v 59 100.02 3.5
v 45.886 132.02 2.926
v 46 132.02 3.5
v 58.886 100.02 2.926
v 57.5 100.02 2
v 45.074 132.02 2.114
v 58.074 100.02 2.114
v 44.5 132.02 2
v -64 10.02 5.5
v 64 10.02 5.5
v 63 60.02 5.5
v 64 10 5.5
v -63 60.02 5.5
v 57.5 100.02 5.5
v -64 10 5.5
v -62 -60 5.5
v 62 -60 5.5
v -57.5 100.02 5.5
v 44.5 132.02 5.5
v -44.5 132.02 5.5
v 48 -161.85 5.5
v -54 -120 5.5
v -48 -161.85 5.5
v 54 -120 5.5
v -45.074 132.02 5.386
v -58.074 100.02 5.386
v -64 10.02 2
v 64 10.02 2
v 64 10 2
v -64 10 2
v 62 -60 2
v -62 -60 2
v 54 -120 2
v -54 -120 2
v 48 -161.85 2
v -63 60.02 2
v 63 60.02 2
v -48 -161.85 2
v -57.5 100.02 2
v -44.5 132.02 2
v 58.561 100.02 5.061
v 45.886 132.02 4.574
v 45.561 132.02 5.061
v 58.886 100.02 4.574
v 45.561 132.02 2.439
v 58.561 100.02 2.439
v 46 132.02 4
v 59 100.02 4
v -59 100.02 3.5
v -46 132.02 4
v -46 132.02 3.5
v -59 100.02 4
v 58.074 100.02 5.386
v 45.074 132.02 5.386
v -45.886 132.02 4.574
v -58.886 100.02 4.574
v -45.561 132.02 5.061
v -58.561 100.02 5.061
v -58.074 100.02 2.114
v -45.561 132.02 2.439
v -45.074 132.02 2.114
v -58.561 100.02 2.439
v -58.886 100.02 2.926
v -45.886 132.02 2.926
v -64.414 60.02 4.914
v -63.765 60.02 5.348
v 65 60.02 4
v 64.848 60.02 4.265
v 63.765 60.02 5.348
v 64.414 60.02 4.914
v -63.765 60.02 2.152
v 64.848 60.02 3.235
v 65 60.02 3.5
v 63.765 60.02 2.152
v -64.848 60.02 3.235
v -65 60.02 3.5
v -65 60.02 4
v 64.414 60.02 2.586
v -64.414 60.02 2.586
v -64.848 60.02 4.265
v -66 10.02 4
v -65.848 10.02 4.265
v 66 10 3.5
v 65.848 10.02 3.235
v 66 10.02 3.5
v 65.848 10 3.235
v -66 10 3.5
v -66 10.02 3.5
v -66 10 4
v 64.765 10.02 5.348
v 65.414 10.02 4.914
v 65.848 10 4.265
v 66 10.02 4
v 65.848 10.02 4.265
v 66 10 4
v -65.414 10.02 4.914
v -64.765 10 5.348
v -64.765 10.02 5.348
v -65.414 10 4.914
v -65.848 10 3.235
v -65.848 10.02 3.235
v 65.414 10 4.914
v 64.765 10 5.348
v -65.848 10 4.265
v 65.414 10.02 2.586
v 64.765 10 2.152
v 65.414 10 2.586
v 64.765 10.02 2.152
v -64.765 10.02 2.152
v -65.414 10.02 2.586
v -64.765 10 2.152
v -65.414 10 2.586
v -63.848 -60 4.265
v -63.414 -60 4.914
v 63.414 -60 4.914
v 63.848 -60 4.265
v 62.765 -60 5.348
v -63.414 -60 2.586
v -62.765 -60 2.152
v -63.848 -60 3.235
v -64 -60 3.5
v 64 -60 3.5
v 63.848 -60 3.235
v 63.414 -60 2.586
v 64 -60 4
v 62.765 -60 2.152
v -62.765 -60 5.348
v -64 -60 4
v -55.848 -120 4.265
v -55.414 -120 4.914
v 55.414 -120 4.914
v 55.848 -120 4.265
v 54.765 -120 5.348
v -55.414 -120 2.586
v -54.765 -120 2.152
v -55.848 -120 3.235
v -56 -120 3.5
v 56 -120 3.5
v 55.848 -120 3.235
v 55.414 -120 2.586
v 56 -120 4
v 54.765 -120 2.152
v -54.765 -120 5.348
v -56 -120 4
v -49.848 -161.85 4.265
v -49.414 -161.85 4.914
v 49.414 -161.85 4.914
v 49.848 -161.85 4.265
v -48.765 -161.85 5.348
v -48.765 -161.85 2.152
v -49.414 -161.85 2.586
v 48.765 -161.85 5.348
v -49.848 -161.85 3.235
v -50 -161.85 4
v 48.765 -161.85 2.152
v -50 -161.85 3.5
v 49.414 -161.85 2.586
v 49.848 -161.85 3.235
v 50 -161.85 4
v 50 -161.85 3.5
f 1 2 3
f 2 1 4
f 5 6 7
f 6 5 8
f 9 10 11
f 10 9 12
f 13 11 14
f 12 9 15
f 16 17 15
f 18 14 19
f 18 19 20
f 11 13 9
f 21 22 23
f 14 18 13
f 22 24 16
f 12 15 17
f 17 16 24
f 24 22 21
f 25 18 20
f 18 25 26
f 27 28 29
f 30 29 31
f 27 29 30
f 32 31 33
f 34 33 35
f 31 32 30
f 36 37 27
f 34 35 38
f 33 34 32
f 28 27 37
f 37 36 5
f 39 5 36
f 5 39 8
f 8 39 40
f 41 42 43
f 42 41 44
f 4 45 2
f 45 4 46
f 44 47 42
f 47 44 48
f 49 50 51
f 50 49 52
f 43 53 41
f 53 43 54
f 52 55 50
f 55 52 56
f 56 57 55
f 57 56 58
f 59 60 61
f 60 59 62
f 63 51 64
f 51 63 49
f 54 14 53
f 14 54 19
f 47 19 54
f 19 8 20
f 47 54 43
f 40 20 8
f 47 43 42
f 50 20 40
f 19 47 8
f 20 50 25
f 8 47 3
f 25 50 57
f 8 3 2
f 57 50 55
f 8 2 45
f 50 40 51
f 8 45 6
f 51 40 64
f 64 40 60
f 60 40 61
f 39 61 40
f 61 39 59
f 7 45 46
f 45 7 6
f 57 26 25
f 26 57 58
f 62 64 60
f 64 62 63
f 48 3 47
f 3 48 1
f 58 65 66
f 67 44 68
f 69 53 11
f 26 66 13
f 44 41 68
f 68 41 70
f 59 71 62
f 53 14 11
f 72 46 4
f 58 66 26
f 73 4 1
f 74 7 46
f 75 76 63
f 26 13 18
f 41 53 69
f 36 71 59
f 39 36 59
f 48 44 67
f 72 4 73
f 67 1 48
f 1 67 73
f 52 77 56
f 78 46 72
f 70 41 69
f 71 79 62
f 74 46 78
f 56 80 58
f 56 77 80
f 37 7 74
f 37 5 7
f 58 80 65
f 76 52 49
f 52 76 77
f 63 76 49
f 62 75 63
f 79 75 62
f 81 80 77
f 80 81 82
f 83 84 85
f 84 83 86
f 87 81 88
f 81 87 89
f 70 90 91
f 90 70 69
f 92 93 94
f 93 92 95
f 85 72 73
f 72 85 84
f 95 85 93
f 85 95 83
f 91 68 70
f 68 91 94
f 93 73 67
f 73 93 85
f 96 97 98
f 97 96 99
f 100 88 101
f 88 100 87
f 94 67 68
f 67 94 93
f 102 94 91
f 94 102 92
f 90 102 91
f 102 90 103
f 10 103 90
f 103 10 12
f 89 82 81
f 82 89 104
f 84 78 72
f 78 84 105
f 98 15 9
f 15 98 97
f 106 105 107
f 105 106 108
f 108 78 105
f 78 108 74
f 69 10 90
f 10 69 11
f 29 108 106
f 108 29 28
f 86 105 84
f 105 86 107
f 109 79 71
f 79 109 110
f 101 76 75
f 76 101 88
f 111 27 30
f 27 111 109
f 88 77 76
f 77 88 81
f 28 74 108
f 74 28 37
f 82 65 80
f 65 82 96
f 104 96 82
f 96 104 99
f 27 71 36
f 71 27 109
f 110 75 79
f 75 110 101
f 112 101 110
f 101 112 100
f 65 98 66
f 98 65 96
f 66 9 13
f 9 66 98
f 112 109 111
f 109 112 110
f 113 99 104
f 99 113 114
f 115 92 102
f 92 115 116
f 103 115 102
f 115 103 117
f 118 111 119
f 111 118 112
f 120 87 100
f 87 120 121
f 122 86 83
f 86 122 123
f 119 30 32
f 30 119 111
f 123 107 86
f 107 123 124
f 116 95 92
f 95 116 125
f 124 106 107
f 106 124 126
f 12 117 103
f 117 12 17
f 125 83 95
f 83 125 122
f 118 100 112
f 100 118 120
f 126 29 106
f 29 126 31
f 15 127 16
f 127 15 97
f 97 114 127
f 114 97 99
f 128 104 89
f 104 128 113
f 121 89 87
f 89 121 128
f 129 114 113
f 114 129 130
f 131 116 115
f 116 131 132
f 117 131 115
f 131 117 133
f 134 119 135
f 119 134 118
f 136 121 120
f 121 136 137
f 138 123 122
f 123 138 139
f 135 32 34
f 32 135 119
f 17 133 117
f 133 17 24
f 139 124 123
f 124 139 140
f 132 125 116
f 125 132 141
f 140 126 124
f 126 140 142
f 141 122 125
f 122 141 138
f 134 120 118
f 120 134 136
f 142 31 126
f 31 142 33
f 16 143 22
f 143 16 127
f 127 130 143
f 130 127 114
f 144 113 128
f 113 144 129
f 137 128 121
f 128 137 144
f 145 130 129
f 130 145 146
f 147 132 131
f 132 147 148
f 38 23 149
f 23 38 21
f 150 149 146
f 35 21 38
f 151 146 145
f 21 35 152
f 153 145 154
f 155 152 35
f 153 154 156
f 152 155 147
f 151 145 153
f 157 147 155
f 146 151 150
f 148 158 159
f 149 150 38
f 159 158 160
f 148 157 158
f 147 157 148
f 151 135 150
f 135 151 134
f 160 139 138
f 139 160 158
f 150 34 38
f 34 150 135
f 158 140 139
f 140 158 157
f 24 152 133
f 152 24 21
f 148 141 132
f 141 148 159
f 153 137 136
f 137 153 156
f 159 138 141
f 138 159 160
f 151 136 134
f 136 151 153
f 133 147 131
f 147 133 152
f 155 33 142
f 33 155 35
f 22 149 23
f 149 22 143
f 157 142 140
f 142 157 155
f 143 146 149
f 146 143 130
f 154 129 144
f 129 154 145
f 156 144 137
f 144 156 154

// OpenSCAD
// file: ../lib.scad
// ===== 공용 프리미티브 (params 의존 없음 — use로 포함. 함정 1) =====

// 두 점을 잇는 캡슐. 끝단이 od/2 만큼 뻗는다 (함정 3)
module rod(p1, p2, od, fn = 56)
    hull() { translate(p1) sphere(d = od, $fn = fn);
             translate(p2) sphere(d = od, $fn = fn); }

function mir(p, s = 1) = [s * p.x, p.y, p.z];

// --- 라운디드 사각 2D 폴리곤 (CCW) ---
function arc_pt(cx, cy, r, a) = [cx + r * cos(a), cy + r * sin(a)];
function rrpts(w, h, r, n = 4) =
    let (x = w / 2 - r, y = h / 2 - r)
    concat(
        [for (i = [0:n]) arc_pt( x, -y, r, -90 + 90 * i / n)],
        [for (i = [0:n]) arc_pt( x,  y, r,   0 + 90 * i / n)],
        [for (i = [0:n]) arc_pt(-x,  y, r,  90 + 90 * i / n)],
        [for (i = [0:n]) arc_pt(-x, -y, r, 180 + 90 * i / n)]);

// y 위치의 XZ 단면 슬래브 (중심 x0/zc, 폭 w/높이 h, 모서리 r).
// 회전 매핑: 2D x→차량 X, 2D y→차량 Z, 돌출 +z→−Y (y..y+0.02 전방 전용, 함정 20)
module slabr(y, x0, w, h, zc, r)
    translate([x0, y + 0.02, zc]) rotate([90, 0, 0])
        linear_extrude(0.02) polygon(rrpts(w, h, r));

// 단면 체인 loft: sec = [[y, x0, w, h, zc, r], ...]
module loftr(sec)
    for (i = [0 : len(sec) - 2])
        hull() {
            slabr(sec[i][0],     sec[i][1],     sec[i][2],     sec[i][3],     sec[i][4],     sec[i][5]);
            slabr(sec[i + 1][0], sec[i + 1][1], sec[i + 1][2], sec[i + 1][3], sec[i + 1][4], sec[i + 1][5]);
        }

// 라운디드 박스 (z0..z1 수직, 평면 모서리 r)
module rbox(xc, yc, z0, z1, dx, dy, r, fn = 32)
    hull() for (px = [-1, 1], py = [-1, 1])
        translate([xc + px * (dx / 2 - r), yc + py * (dy / 2 - r), z0])
            cylinder(r = r, h = z1 - z0, $fn = fn);

// --- NACA 계열 에어포일 (LE 원점, 2D +x = 현 방향) ---
function _yt(x, c, t) = 5 * t * c * (0.2969*sqrt(x) - 0.1260*x - 0.3516*x*x
    + 0.2843*x*x*x - 0.1036*x*x*x*x);
function _yc(x, c, m) = 4 * m * c * x * (1 - x);
function naca_pts(c, t, m, n = 12) =
    concat(
        [for (i = [0:n])     let (x = i / n)     [x*c,  _yt(x, c, t) + _yc(x, c, m)]],
        [for (i = [n-1:-1:0]) let (x = i / n)    [x*c, -_yt(x, c, t) + _yc(x, c, m)]]);

// 슬라이스 3D 링: v=[x, yle, zle, c, aoa, th, cam] → 받각 회전된 naca 점의 링
// (th/cam은 mm — 현 대비 비율로 정규화)
function wring(v, n = 12) =
    let (c = v[3], t = v[5] / c, m = v[6] / c, pts = naca_pts(c, t, m, n),
         ca = cos(v[4]), sa = sin(v[4]))
    // 코드 방향 (ca,sa) + 두께/캠버 수직 방향 (-sa,ca) — 2D y 누락 금지
    [for (p = pts) [v[0], v[1] + p[0] * ca - p[1] * sa, v[2] + p[0] * sa + p[1] * ca]];

// 진짜 로프트 윙 — polyhedron 스트립. hull 체인은 캠버진 하면을 볼록 껍질로
// 채워(LE→TE 직선 웨지) 요소가 처지므로 쓰지 않는다
module wing3(sl, n = 12) {
    rings = [for (v = sl) wring(v, n)];
    ns = len(rings);
    m = len(rings[0]);
    pts = [for (r = rings, p = r) p];
    function ix(i, k) = i * m + (k % m);
    faces = concat(
        // 측면 스트립 (사중면 → 삼각형 2) — 외향 노멀 권선(캡과 일치)
        [for (i = [0 : ns - 2], k = [0 : m - 1])
            each [[ix(i, k), ix(i, k + 1), ix(i + 1, k + 1)],
                  [ix(i, k), ix(i + 1, k + 1), ix(i + 1, k)]]],
        // 끝 캡 (링은 단순 폴리곤 — 팬 삼각분할)
        [for (k = [1 : m - 2]) [ix(0, 0), ix(0, k + 1), ix(0, k)]],
        [for (k = [1 : m - 2]) [ix(ns - 1, 0), ix(ns - 1, k), ix(ns - 1, k + 1)]]
    );
    polyhedron(points = pts, faces = faces, convexity = 4);
}

// 반쪽 슬라이스 → x-대칭 전체. 규약: half는 센터(x=0)→팁 순서(내림차순 x).
// 결과는 x 오름차순 체인. x=0 센터만 중복 제외 (그 외 전부 미러)
function wsym(half) =
    concat([for (i = [len(half) - 1 : -1 : 0]) half[i]],
           [for (i = [0 : len(half) - 1]) if (abs(half[i][0]) > 1e-9)
               concat([-half[i][0]], [for (j = [1 : len(half[i]) - 1]) half[i][j]])]);

// 환(링), 축 Z
module ann(r_in, r_out, h, fn = 96)
    difference() { cylinder(r = r_out, h = h, center = true, $fn = fn);
                   cylinder(r = r_in,  h = h + 2, center = true, $fn = fn); }

// 리스트 전체 x반전+순서 역행 (센터 구간 없는 플랩 등 — 좌우 별도 wing3 호출용).
// x반전만 하면 행렬식이 음수가 되어 권선이 뒤집힌다 → 순서 역행으로 상쇄
function msym(half) =
    [for (i = [len(half) - 1 : -1 : 0])
        concat([-half[i][0]], [for (j = [1 : len(half[i]) - 1]) half[i][j]])];
// file: ../params.scad
// =====================================================================
// F1 그랜드파이언스 카 1:10 — 전체 파라미터 (유일한 수정 지점)
// 좌표계: +Y 전방, +X 좌측, +Z 상방, 지면 z=0, 원점=휠베이스 중심
// 전장 558 (y -268..+278), 전폭 194, 휠베이스 360, 타이어 OD 72 (720mm)
// 30부품. loftr 단면 = [y, x0, w, h, zc, r] (XZ 단면, y..y+0.02 슬래브)
// wing3 슬라이스 = [x, yle, zle, c, aoa, th, cam]
//   aoa: 현 방향의 X축 회전각. 전방 받각 요소는 165~170 (TE가 뒤+위)
// =====================================================================
$fn = 96;

// -- 휠/액슬 (실차 720mm 타이어, 18인치 림, 트랙 F1600/R1550) --
AXF_Y = 180;   AXR_Y = -180;
WHF_X = 80;    WHR_X = 77.5;
WH_Z  = 36;
TIRF_W = 30.5; TIRR_W = 40.5;  TIR_R = 36;
TIR_FN = 288;                 // 타이어 회전체 해상도
RIM_R = 23.2;  RIM_T = 1.0;   // 림 배럴 반경/두께
RIM_LF = 12.4; RIM_LR = 17.4; // 림 배럴 반폭
HUB_BORE = 7.0; STUB_D = 6.2; // 방사 간극 0.4
DISC_R = 15.5;                // 브레이크 디스크

// -- 바디 공통 레벨 --
FLO_Z0 = 2.0;  FLO_Z1 = 5.5;  // 플로어 (두께 3.5)
BOD_Z0 = 5.65;                // 샤시/카버/기어박스 바닥 (플로어 위 0.15)
J = 0.15;                     // 부품 접합 기본 간극
ARM_OD = 3.4;                 // 서스펜션 암 캡슐 직경

// ===== 01 플로어 =====
FLOOR_SEC = [
    [132,    0,  92, 3.5, 3.75, 1.5], [100, 0, 118, 3.5, 3.75, 1.5],
    [60,     0, 130, 3.5, 3.75, 2.0], [10,  0, 132, 3.5, 3.75, 2.0],
    [-60,    0, 128, 3.5, 3.75, 2.0], [-120, 0, 112, 3.5, 3.75, 2.0],
    [-161.85, 0, 100, 3.5, 3.75, 2.0]];

// ===== 02 디퓨저 (램프 + 스트레이크는 부품 내부) =====
DIFF_SEC = [
    [-230,   0, 100, 10.0, 11.0, 1.5], [-215, 0, 100, 8.0,  9.0, 1.5],
    [-190,   0, 100,  6.0,  6.2, 1.5], [-162.0, 0, 100, 4.0, 4.15, 1.5]];
DIFF_TOP = [[-175, 7.8], [-205, 11.9], [-228, 15.6]];  // (y, 램프 상면 z)

// ===== 03 플로어 에지 윙 =====
FEW_SEC = [   // [y, x0, w, h, zc, r] — x0 부호로 좌우
    [55,   63.5, 3.0, 2.0, 6.65, 1.0], [-5,  65.5, 3.0, 5.5, 8.40, 1.5],
    [-70,  63.0, 3.0, 4.0, 7.65, 1.5], [-120, 58.0, 3.0, 3.0, 7.15, 1.5]];
FEW2_SEC = [
    [100, 57.0, 2.5, 1.5, 6.40, 0.8], [60, 60.0, 2.5, 2.0, 6.65, 0.8]];

// ===== 04 노우즈 =====
NOSE_SEC = [
    [95,   0, 38, 28, 25.3, 12], [100,  0, 38, 29, 25.3, 12],
    [115,  0, 36, 28, 23.8, 11], [135,  0, 31, 24, 21.3,  9],
    [160,  0, 27, 20, 18.3,  8], [185,  0, 23, 17, 15.8,  7],
    [205,  0, 20, 15, 14.3,  6], [224,  0, 17, 12, 12.3,  5],
    [242,  0, 14,  9, 10.8,  4], [258,  0, 10,  7, 10.1,  3],
    [272,  0,  4.5, 4.5, 9.8, 2], [273.5, 0, 1.2, 1.2, 9.8, 0.6]];

// ===== 05 샤시(모노코크) + 콕핏 컷 =====
CHAS_SEC = [
    [-34.85, 0, 46, 44, 27.65, 15], [-10, 0, 48, 46, 28.65, 15],
    [20,     0, 48, 44, 27.65, 15], [60,  0, 46, 40, 25.65, 14],
    [94.85,  0, 42, 34, 22.65, 12]];
CKP_CUT = [[62, 0, 34, 32, 46, 3], [-30, 0, 34, 30, 45, 3]];

// ===== 06 엔진 커버 + 샤크핀 =====
COV_SEC = [
    [-152,   0,  8, 14, 35.65,  6], [-140, 0, 12, 18, 32.65,  7],
    [-120,   0, 18, 24, 29.65,  9], [-95,  0, 26, 30, 26.15, 11],
    [-70,    0, 34, 36, 25.65, 13], [-50,  0, 40, 40, 25.65, 14],
    [-35.15, 0, 44, 42, 26.65, 15]];
FIN_SEC = [
    [-162, 0, 2.2, 44, 62.0, 1], [-120, 0, 2.5, 30, 56.0, 1],
    [-92.2, 0, 2.5, 10, 45.0, 1]];

// ===== 07 에어박스 (험프 + 인테이크 링) =====
ABX_SEC = [
    [-92, 0, 14, 17, 50.00, 6], [-68, 0, 20, 24, 56.60, 8],
    [-46, 0, 22, 26, 59.60, 8], [-34, 0, 22, 13, 56.30, 6]];
ABX_RING_C = [0, -45, 73.5];  ABX_RING_R = 11;  ABX_RING_T = 4.5;
ABX_RING_SZ = 0.72;

// ===== 08 사이드포드 (x0=±41.5) =====
SPOD_X0 = 41.5;
SPOD_SEC = [   // [y, w, h, zc, r]
    [38,   34, 26, 18.65, 8], [5,   34, 28, 19.65, 9], [-25,  34, 26, 18.65, 9],
    [-55,  32, 21, 18.15, 8], [-80, 30, 15, 17.15, 8], [-100, 26,  9, 16.15, 7]];
SPOD_INLET = [24, 18, 19, 2.3];  // 컷: w, h, zc, 깊이

// ===== 09 할로 =====
HALO_N = 28;  HALO_OD = 9;
HALO_RX = 22; HALO_RY = 44; HALO_CY = 12;  // 타원 계획면(평면도)
HALO_Z0 = 75; HALO_ZA = 2;                 // z(t) = Z0 + ZA*cos(t)

// ===== 10/11/12/13 프런트 윙 =====
FW_MAIN_HALF = [   // 반쪽(x≤0) — wsym()로 전체화
    [0,    258.3, 2.4, 20, 170, 1.4, 2.0],
    [-16,  259.0, 3.4, 27, 165, 1.6, 2.4],
    [-40,  260.0, 3.6, 40, 166, 1.8, 2.8],
    [-60,  257.0, 4.0, 37, 167, 1.7, 2.6],
    [-80,  258.0, 4.4, 31, 166, 1.6, 2.2],
    [-95.2, 263.0, 4.6, 26, 166, 1.5, 1.8]];
FW_F1_HALF = [
    [-16,  253.0, 8.0, 22, 155, 1.3, 4.0],
    [-40,  250.5, 8.2, 26, 156, 1.4, 4.2],
    [-60,  249.5, 8.4, 26, 157, 1.4, 4.2],
    [-80,  250.0, 8.6, 24, 158, 1.4, 4.0],
    [-95.2, 254.0, 8.8, 21, 158, 1.3, 3.5]];
FW_F2_HALF = [
    [-16,  258.0, 12.4, 17, 147, 1.2, 4.5],
    [-40,  255.5, 12.6, 20, 148, 1.3, 4.8],
    [-60,  254.5, 12.8, 20, 149, 1.3, 4.8],
    [-80,  254.5, 13.0, 19, 150, 1.3, 4.5],
    [-95.2, 258.0, 13.2, 17, 150, 1.2, 4.0]];
FW_EP_X = 96.3;  FW_EP_T = 1.5;   // 엔드플레이트 x 중심/두께
FW_EP_PTS = [    // (y,z) 아웃라인
    [226, 1.5], [266, 1.5], [266, 8], [263, 24.5], [252, 24.5],
    [244, 17], [233, 15], [226, 9]];
FW_MT_SEC = [   // 마운트 플레이트 [y, x0(±2.6), w, h, zc, r] — 노우즈 저면 라운딩 회피
    [244, 2.6, 1.6, 1.8, 5.25, 0.5], [250, 2.6, 1.6, 1.8, 5.25, 0.5]];

// ===== 14 리어 윙 =====
RW_MAIN = [
    [-50.8, -212, 57.5, 46, 162, 2.2, -3.5], [-25, -211, 56.6, 47, 162, 2.3, -4.0],
    [0,     -210, 54.2, 47, 162, 2.3, -4.0], [25,  -211, 56.6, 47, 162, 2.3, -4.0],
    [50.8,  -212, 57.5, 46, 162, 2.2, -3.5]];
RW_FLAP = [
    [-49.6, -234,   71.8, 30, 155, 1.8, -4.5],
    [0,     -235.5, 73.0, 30, 155, 1.8, -4.5],
    [49.6,  -234,   71.8, 30, 155, 1.8, -4.5]];
RW_EP_X = 52;  RW_EP_T = 2;
RW_EP_PTS = [
    [-200, 46], [-268, 46], [-268, 60], [-262, 93], [-250, 93],
    [-243, 72], [-218, 64], [-202, 74]];
RW_DRS = [-245, 79.4, 5.0, 2.6, 3.0];   // 팟: y, z, w, h, 두께

// ===== 15 빔 윙 =====
BEAM_E1 = [
    [-50.9, -204.5, 31.5, 16, 162, 1.8, -2.5], [0, -205.5, 30.4, 16, 162, 1.8, -2.5],
    [50.9,  -204.5, 31.5, 16, 162, 1.8, -2.5]];
BEAM_E2 = [
    [-50.9, -210, 36.8, 15, 158, 1.6, -3.0], [0, -211, 35.6, 15, 158, 1.6, -3.0],
    [50.9,  -210, 36.8, 15, 158, 1.6, -3.0]];
BEAM_PLATE = [-214, -200.15, 8.2, 22, 31];  // 마운트 플레이트 y1,y0,x반폭,z0,z1

// ===== 16 리어윙 파일론(쌍둥 스완넥) =====
RW_PYL = [[-158, 55.0], [-190, 58.0], [-212.5, 63.0]];  // (y, z), x=±5.4
RW_PYL_X = 5.4;  RW_PYL_OD = 8;

// ===== 17 미러 =====
MIR_BASE = [14, 63, 46.0];  MIR_HOUSE = [31, 66, 56.5];

// ===== 18 헬멧 =====
HELM_C = [0, 0, 55];  HELM_R = 11.5;
HELM_SC = [1, 1.18, 1.02];

// ===== 19 콕핏 트림 =====
SEAT_SEC  = [[30, 0, 26, 13.2, 36.75, 3], [-10, 0, 26, 13.2, 36.75, 3]];
HREST_SEC = [[12, 0, 32, 15, 53.5, 5], [-20, 0, 32, 15, 53.5, 5]];

// ===== 20 스티어링 휠 =====
SW_C = [0, 40, 47];  SW_TILT = 20;

// ===== 21/22 서스펜션 (픽업=[x, y, z], 암 끝은 업라이트 내부) =====
FUP = [61, 183, 46];  FLO_BALL = [61.5, 181, 24];  FTR = [61.5, 177, 35];
FPU = [61.5, 180, 27];
F_ARM = [   // [픽업, 볼]
    [[12.0, 206, 20.0], FUP],  [[16.0, 152, 23.0], FUP],
    [[11.9, 208,  9.3], FLO_BALL], [[16.3, 150, 12.0], FLO_BALL],
    [[15.6, 162, 14.0], FTR]];
F_PUSH = [[11.8, 198, 24.4], FPU];
RUP = [53.5, -182, 46];  RLO = [54, -179, 23];  RDRIVE_O = [52, -180, 31];
R_ARM = [
    [[13.3, -160, 47.0], RUP], [[13.3, -198, 45.0], RUP],
    [[12.8, -158, 20.4], RLO], [[9.2, -202, 19.6], RLO]];
R_PULL = [[12.6, -177, 23.75], [53.5, -181, 44]];
R_DRIVE = [[13.2, -180, 17.0], RDRIVE_O];

// ===== 23/24 브레이크 스쿱 =====
SCOOP_F = [[164.2, 59.5, 7, 11, 30, 3], [158, 58.5, 5.5, 8, 28.5, 2.5]];
SCOOP_R = [[-164.2, 48, 7, 10, 29, 3], [-158, 46, 5, 7.5, 27.5, 2.5]];

// ===== 25~28 타이어/림 =====
TIRE_BEAD = 2.6;   // 비드 안쪽 세팅 (단면 반경 23.4)

// ===== 29 기어박스 + 리어 크래시 =====
GEAR_SEC = [
    [-258,   0,  4,  1.8, 15.00, 1.5], [-252, 0,  6,  1.6, 16.30, 2],
    [-230,   0,  9,  1.4, 18.30, 3],   [-208, 0, 12,  4.9, 15.05, 4],
    [-195,   0, 16,  9.35, 14.83, 5],   [-170, 0, 20, 15.1, 15.45, 6],
    [-145,   0, 22, 15.95, 13.60, 7],  [-117.85, 0, 26, 8.6,  9.95, 8]];
GEAR_TOWER = [-200, -158, 8, 11.3, 28, 50];  // y1,y0,x내측,x외측,z0,z1
RAIN_LT = [-258.6, 5, 4];   // y면, w, h

// ===== 30 카메라/안테나 =====
TCAM_Y = -45;  TCAM_Z0 = 84.8;
SIDECAM = [[194, 19.0], [202, 18.5]];  // (y, z) — x는 노우즈 반폭+0.15
ANT = [[4, 70], [-4, 70]];             // (x, y) — chassis 탑
// main file
// 01 플로어 — 벤추리 플로어 플레이트 (에지 윙은 03)
include <../params.scad>
use <../lib.scad>

module floor_plate() loftr(FLOOR_SEC);

floor_plate();
